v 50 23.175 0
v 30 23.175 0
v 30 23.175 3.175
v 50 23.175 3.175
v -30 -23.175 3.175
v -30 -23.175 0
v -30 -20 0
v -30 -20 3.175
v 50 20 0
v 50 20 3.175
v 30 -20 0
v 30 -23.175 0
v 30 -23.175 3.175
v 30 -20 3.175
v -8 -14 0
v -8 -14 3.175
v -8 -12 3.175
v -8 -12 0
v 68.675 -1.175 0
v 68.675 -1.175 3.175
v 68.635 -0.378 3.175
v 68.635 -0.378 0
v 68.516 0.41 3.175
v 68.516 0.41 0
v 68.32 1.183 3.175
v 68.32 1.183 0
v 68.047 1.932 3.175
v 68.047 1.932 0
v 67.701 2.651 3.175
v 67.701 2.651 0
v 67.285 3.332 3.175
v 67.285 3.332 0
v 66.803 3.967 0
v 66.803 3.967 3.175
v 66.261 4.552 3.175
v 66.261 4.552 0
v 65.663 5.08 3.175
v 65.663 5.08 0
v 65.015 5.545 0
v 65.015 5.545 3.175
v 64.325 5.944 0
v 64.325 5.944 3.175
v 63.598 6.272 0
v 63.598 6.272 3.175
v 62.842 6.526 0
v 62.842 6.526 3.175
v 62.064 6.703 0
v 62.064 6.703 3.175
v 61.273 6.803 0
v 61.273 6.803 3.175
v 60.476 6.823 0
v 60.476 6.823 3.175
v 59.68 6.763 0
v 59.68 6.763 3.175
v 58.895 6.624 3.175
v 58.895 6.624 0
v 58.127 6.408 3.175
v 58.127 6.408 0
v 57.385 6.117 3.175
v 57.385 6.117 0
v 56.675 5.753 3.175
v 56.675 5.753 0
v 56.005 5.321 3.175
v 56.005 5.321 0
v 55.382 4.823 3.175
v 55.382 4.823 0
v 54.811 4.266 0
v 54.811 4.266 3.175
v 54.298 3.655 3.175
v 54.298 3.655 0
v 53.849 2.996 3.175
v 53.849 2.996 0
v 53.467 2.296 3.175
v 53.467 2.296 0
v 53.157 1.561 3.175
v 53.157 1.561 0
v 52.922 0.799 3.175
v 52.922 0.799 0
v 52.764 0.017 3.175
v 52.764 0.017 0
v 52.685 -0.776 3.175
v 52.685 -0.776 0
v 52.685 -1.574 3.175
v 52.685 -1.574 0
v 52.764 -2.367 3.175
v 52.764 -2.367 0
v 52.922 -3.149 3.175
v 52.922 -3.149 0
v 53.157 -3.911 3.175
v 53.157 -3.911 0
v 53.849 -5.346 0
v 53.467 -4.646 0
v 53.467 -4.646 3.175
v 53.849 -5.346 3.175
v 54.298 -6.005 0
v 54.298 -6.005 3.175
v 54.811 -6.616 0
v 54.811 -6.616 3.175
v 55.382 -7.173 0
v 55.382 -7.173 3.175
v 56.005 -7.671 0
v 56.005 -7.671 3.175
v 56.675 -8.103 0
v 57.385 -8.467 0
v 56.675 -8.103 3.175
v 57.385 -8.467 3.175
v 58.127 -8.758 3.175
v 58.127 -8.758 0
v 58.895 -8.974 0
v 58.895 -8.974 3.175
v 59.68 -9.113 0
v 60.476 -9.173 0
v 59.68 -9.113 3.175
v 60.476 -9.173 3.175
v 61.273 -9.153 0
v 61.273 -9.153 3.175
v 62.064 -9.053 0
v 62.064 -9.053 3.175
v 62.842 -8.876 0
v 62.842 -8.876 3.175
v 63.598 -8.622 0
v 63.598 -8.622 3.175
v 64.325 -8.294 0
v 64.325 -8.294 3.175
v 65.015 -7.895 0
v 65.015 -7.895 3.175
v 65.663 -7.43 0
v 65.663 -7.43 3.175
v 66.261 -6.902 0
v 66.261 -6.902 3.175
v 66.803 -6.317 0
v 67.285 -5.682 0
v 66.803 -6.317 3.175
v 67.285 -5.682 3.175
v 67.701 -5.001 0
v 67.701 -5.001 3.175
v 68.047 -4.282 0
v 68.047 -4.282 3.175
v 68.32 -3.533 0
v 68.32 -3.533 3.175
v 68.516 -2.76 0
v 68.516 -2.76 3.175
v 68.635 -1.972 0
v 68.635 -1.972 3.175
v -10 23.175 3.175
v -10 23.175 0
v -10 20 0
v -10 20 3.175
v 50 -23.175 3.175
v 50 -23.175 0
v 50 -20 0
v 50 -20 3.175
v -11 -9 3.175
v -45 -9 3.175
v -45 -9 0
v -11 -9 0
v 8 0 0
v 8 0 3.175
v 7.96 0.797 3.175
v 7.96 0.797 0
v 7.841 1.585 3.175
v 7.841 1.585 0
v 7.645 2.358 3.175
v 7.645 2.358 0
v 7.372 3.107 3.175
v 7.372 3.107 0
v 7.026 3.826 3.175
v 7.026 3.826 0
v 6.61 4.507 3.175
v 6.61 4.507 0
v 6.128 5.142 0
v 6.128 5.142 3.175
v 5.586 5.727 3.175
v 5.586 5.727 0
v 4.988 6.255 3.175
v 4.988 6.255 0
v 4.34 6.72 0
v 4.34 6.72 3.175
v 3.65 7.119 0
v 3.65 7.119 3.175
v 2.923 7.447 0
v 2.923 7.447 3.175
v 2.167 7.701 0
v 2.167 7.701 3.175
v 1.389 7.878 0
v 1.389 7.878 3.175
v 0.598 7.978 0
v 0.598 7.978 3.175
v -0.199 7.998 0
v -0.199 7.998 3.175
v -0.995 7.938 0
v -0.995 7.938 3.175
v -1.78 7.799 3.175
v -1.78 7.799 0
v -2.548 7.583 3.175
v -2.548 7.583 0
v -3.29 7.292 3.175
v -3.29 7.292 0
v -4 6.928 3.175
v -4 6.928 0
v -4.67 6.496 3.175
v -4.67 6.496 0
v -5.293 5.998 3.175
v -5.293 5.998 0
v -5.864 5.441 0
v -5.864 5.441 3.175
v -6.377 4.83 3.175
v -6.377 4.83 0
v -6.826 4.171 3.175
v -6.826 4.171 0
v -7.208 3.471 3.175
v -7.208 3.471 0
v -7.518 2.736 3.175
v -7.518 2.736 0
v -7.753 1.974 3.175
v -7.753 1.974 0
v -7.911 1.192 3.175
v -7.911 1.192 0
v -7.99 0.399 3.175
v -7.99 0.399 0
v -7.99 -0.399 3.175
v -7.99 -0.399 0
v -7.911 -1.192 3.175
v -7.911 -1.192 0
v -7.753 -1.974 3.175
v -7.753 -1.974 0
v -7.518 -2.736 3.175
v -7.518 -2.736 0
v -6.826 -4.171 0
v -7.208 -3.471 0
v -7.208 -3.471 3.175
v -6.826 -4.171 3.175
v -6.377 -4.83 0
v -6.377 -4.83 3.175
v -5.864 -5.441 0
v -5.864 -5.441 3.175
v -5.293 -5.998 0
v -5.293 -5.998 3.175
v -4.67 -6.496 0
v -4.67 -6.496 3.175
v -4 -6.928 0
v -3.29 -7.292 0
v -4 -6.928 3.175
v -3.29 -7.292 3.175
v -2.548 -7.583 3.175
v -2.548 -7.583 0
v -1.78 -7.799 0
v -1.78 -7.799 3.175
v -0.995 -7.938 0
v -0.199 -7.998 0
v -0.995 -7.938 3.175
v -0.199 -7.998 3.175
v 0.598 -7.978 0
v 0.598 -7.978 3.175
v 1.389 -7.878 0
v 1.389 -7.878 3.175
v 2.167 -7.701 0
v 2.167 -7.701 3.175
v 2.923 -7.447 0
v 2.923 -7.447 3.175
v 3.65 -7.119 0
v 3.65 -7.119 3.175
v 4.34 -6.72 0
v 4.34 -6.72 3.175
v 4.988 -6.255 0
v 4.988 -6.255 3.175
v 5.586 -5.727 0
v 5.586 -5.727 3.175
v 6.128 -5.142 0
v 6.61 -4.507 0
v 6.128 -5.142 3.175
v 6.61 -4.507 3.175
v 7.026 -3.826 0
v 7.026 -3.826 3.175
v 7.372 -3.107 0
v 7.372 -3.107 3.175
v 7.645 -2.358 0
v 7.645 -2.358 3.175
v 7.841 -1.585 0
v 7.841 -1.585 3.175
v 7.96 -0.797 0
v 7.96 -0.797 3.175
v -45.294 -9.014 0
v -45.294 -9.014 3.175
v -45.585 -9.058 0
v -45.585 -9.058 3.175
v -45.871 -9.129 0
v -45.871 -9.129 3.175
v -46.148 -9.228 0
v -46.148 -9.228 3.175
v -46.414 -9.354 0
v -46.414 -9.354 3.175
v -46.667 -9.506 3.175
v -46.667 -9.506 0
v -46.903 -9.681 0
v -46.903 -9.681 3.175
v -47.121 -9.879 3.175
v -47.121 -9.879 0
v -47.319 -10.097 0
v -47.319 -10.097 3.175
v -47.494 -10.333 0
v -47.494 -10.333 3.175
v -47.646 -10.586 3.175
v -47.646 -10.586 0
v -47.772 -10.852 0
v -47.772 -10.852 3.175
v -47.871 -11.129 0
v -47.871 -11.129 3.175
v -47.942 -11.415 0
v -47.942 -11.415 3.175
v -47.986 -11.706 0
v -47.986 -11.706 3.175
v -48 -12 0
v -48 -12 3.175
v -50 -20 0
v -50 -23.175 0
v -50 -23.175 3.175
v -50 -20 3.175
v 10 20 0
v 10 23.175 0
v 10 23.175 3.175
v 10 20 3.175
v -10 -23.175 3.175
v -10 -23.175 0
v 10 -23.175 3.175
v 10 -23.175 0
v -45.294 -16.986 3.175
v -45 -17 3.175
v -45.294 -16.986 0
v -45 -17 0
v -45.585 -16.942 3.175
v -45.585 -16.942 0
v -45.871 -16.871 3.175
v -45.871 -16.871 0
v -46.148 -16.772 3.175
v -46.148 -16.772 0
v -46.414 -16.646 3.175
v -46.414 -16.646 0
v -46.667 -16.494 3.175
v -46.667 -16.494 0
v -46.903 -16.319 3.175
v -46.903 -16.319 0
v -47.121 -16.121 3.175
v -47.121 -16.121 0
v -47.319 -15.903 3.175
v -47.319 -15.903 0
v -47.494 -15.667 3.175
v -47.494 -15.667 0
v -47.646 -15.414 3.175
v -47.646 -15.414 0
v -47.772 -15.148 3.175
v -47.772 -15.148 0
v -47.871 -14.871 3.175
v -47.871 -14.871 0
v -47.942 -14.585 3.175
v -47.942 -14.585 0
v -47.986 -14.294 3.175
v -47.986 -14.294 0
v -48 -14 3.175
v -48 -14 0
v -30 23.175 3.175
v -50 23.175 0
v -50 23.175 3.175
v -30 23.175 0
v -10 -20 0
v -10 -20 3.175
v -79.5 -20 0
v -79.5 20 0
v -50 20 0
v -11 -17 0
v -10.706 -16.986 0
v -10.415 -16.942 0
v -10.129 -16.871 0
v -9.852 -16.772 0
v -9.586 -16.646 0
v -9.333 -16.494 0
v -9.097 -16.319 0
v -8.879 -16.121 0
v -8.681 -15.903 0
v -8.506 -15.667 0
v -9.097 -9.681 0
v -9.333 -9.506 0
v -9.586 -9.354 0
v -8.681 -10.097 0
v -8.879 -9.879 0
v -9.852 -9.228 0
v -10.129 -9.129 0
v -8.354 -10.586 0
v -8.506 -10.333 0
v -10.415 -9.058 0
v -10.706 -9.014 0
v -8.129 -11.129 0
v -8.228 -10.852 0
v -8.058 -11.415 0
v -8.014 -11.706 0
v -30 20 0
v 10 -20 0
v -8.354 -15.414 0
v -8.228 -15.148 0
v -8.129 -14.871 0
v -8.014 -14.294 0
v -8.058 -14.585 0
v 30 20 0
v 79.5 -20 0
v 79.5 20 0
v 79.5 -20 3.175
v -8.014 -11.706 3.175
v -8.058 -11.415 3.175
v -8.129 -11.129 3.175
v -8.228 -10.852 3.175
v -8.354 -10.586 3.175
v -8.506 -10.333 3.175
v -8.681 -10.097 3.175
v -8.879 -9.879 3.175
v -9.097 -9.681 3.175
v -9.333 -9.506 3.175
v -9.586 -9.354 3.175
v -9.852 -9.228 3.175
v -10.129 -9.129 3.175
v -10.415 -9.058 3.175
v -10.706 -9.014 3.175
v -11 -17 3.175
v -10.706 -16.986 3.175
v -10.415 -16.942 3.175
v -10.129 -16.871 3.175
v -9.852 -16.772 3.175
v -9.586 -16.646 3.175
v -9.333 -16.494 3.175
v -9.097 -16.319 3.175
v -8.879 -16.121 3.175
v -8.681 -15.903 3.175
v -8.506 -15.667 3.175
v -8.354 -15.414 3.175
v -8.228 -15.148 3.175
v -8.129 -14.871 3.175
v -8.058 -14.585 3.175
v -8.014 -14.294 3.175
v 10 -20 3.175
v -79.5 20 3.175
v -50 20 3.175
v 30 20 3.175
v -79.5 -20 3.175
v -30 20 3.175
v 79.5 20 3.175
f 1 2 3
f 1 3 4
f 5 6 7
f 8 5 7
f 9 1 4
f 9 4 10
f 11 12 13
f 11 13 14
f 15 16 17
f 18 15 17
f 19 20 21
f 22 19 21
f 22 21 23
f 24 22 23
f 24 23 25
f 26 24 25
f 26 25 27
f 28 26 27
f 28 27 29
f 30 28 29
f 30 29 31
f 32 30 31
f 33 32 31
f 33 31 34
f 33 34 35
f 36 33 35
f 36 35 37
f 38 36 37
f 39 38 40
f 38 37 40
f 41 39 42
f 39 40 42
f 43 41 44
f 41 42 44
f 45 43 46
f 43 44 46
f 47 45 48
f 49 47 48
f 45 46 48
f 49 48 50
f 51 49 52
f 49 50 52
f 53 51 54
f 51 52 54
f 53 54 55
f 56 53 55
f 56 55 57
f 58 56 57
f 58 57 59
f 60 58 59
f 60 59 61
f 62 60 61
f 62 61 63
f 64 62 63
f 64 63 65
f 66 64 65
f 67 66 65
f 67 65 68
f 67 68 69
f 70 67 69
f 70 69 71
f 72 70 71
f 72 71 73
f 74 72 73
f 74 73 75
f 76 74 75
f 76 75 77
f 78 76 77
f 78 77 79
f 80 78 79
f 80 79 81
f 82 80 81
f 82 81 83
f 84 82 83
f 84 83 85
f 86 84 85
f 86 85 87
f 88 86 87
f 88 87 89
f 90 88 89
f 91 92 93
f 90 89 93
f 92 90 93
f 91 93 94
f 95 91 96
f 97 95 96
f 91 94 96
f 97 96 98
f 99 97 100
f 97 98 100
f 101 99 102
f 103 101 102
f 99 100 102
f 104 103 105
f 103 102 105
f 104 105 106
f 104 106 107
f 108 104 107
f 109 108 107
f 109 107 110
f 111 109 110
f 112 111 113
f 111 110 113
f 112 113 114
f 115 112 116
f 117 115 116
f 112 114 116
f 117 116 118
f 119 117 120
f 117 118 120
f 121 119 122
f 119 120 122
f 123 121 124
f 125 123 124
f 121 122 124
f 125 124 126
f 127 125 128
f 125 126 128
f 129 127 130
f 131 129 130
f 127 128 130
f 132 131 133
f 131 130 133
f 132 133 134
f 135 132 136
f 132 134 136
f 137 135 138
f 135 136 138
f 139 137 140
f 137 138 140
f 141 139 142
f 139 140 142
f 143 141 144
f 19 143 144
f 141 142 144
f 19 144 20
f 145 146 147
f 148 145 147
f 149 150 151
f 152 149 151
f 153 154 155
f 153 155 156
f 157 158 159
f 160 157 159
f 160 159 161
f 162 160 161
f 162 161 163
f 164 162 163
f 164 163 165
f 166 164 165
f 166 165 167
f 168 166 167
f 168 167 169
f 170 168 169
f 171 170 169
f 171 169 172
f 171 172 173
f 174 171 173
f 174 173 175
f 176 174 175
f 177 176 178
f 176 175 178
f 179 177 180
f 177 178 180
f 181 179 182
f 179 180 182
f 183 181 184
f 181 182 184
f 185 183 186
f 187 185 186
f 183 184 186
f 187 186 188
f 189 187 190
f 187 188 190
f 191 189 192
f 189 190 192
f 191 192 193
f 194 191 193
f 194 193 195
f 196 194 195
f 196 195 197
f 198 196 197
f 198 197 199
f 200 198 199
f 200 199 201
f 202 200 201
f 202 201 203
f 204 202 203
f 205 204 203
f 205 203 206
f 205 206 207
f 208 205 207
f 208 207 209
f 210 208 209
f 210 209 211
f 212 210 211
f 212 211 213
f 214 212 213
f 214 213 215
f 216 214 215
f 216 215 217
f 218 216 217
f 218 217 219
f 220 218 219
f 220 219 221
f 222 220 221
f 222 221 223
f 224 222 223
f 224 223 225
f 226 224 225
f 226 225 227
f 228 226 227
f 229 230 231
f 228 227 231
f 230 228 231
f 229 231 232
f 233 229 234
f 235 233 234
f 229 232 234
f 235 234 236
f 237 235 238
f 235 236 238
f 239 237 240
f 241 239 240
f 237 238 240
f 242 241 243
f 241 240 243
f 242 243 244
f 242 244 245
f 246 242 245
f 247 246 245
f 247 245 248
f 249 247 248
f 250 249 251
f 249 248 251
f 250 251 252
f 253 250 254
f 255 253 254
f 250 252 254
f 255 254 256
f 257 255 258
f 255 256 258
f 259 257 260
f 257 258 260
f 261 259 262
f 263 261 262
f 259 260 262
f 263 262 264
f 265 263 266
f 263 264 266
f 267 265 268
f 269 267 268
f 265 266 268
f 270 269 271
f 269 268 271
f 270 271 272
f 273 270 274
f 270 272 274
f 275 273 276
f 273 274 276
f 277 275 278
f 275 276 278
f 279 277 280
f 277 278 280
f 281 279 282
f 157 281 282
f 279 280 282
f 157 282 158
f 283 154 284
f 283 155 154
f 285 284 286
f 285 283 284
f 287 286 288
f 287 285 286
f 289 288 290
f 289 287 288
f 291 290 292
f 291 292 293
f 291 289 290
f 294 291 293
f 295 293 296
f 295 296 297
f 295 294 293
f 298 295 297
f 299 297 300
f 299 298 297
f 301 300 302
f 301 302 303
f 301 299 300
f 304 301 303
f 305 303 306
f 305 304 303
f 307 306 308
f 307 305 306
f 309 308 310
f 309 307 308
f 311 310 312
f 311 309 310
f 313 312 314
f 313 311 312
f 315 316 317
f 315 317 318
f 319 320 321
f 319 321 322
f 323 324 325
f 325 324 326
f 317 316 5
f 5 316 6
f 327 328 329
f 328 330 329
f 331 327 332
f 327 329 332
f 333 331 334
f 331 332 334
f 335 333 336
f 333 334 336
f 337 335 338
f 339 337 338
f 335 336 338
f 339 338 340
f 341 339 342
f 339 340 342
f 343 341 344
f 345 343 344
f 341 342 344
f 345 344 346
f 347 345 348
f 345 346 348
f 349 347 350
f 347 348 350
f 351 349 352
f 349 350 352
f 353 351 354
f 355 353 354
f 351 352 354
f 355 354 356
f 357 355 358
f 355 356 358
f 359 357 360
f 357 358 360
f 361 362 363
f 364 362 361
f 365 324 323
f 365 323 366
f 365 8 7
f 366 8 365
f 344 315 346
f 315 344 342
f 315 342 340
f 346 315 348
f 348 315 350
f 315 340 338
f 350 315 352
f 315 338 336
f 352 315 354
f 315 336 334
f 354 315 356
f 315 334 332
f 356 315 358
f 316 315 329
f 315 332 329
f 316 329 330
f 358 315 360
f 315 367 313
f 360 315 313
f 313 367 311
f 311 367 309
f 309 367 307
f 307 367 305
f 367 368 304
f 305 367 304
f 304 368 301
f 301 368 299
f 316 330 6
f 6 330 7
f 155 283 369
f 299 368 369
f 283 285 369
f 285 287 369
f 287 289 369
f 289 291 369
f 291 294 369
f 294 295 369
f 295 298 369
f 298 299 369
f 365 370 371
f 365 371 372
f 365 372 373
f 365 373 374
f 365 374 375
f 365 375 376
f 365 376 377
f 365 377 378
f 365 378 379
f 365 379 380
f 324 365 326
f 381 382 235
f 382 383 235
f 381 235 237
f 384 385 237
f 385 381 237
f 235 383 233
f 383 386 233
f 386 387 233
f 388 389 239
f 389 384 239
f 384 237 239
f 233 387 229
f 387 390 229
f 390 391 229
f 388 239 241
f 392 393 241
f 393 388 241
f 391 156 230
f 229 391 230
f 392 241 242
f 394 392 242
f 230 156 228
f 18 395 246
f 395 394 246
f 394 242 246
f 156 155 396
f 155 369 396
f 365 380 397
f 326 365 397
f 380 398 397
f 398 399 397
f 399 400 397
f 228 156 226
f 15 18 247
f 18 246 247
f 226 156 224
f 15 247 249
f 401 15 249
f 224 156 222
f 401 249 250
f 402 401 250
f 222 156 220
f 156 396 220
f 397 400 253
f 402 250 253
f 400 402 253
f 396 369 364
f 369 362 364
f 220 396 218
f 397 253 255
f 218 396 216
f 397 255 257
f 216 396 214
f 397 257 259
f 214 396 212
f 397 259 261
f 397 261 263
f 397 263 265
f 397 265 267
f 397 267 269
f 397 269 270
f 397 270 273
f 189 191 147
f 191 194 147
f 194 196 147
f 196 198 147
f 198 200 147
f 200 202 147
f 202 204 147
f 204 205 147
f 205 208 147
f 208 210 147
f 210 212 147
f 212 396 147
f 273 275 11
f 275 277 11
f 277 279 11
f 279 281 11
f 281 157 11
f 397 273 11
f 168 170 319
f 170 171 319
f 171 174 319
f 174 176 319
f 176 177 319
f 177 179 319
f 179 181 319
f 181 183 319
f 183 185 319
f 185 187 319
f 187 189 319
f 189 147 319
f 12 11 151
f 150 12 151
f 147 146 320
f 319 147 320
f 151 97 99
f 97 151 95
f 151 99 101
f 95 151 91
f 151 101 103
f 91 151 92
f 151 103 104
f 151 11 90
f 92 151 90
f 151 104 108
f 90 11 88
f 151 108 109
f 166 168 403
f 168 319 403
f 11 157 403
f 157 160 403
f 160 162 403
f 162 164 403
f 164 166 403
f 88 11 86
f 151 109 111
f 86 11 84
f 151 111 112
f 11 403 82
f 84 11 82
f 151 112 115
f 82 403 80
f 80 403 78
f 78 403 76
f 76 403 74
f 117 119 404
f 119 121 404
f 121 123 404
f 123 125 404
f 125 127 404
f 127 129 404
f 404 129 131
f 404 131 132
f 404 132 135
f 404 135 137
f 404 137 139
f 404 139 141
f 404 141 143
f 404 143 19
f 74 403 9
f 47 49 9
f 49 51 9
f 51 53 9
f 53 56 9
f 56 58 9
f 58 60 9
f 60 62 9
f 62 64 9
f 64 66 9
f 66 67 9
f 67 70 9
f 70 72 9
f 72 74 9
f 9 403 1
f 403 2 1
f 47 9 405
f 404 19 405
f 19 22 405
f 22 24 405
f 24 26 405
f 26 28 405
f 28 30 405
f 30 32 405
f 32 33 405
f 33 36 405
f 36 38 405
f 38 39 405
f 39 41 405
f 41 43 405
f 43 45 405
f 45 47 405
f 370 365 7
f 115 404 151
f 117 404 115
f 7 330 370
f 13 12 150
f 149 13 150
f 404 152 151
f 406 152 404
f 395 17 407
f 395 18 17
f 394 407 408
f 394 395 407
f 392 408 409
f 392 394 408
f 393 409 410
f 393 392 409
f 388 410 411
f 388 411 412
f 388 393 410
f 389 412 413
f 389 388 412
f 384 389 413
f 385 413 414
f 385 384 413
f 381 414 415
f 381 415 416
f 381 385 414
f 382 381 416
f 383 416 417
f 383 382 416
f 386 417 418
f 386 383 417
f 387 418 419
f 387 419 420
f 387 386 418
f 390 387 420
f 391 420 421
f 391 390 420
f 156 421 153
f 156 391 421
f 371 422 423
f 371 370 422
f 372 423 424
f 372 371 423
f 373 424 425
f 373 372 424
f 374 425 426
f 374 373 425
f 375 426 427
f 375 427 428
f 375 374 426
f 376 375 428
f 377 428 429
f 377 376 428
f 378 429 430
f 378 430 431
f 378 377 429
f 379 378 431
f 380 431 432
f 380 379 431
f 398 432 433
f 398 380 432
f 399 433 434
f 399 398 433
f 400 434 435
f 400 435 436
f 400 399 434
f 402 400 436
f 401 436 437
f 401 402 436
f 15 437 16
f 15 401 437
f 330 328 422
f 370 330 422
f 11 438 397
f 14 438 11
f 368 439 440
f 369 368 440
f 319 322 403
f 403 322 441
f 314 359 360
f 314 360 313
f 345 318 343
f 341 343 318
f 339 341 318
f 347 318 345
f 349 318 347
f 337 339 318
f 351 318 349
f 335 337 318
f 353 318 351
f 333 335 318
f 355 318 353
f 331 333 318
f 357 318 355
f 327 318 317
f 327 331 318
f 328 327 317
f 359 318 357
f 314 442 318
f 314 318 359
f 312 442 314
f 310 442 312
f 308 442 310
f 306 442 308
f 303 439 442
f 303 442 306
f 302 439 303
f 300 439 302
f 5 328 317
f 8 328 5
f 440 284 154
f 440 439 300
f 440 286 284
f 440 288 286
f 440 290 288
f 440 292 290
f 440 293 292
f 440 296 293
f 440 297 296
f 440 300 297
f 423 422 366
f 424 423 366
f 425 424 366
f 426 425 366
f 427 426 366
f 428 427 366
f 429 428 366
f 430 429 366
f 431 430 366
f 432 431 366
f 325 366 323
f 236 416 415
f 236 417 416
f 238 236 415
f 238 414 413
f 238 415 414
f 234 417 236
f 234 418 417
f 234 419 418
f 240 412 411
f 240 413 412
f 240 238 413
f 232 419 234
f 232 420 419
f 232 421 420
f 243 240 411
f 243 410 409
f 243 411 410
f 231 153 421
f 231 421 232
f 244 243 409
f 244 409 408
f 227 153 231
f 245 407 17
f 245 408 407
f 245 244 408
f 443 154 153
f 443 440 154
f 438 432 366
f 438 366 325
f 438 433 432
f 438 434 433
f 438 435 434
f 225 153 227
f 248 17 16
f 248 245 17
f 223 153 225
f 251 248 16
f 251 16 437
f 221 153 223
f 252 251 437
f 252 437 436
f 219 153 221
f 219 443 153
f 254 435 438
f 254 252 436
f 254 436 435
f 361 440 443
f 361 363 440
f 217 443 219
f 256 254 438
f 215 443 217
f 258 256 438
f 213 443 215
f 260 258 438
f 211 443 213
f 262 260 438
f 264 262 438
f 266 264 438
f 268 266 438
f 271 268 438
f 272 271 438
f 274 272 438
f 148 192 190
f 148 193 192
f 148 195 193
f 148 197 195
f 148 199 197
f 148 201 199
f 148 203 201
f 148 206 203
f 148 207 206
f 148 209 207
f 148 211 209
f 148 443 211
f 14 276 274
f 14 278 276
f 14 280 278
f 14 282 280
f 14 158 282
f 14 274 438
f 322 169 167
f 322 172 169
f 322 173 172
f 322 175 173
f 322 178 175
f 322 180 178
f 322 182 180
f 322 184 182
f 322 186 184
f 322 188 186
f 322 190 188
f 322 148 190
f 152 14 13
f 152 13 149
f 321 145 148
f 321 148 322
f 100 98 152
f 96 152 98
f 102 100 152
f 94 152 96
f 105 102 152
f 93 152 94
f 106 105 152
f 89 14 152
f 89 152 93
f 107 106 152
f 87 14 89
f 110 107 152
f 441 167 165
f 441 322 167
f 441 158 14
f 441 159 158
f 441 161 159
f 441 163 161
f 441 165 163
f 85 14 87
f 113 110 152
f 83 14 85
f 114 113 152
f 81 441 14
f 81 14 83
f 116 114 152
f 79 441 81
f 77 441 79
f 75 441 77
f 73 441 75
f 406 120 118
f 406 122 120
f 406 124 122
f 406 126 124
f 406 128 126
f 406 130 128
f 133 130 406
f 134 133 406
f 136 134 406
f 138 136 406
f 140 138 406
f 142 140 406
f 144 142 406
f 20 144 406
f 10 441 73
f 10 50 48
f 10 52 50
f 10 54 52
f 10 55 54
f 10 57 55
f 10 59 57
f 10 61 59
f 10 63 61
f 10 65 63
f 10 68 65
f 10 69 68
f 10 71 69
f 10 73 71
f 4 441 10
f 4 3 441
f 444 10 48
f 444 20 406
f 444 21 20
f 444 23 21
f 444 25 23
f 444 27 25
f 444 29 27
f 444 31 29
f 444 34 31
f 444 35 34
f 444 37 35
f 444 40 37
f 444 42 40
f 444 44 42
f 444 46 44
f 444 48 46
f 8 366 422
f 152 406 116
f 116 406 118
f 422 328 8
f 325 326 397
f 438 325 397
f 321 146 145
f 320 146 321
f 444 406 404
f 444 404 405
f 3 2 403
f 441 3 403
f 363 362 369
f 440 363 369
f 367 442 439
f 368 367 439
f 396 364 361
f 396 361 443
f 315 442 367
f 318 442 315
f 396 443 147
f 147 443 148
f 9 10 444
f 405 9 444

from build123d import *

# Parameters (mm, degrees)
ESQUISSE1_W             = 165.35
ESQUISSE1_H             = 46.35
BOSS_EXTRU_1_DEPTH      = 3.175
ESQUISSE5_W             = 20
ESQUISSE5_H             = 3.175
ESQUISSE5_W_2           = 26.325
ENL_V_MAT_EXTRU_2_DEPTH = 86.920410119
ESQUISSE7_W             = 3.175
ESQUISSE7_H             = 46.35
ENL_V_MAT_EXTRU_4_DEPTH = 86.920410119
ESQUISSE8_W             = 3.175
ESQUISSE8_H             = 3.175
ENL_V_MAT_EXTRU_5_DEPTH = 83.869845239
ESQUISSE6_R             = 8
ENL_V_MAT_EXTRU_3_DEPTH = 83.869845239
ESQUISSE9_W             = 40
ESQUISSE9_H             = 8
ENL_V_MAT_EXTRU_6_DEPTH = 83.869845239
CONG_1_R                = 3


with BuildPart() as part:
    # Esquisse1 → Boss.-Extru.1 (new body)
    with BuildSketch(Plane.XY):
        Rectangle(ESQUISSE1_W, ESQUISSE1_H)
    extrude(amount=BOSS_EXTRU_1_DEPTH)

    # Esquisse5 → Enlèv. mat.-Extru.2 (cut, through all)
    with BuildSketch(Plane.XY.offset(3.175)):
        with Locations((-20, -21.5875)):
            Rectangle(ESQUISSE5_W, ESQUISSE5_H)
        with Locations((20, -21.5875)):
            Rectangle(ESQUISSE5_W, ESQUISSE5_H)
        with Locations((63.1625, -21.5875)):
            Rectangle(ESQUISSE5_W_2, ESQUISSE5_H)
        with Locations((-63.1625, -21.5875)):
            Rectangle(ESQUISSE5_W_2, ESQUISSE5_H)
    enl_v_mat_extru_2 = extrude(amount=-ENL_V_MAT_EXTRU_2_DEPTH, mode=Mode.SUBTRACT)

    # Symétrie2: Enlèv. mat.-Extru.2 across plane
    add(enl_v_mat_extru_2.mirror(Plane.ZX), mode=Mode.SUBTRACT)

    # Esquisse7 → Enlèv. mat.-Extru.4 (cut, through all)
    with BuildSketch(Plane.XY.offset(3.175)):
        with Locations((-81.0875, 0)):
            Rectangle(ESQUISSE7_W, ESQUISSE7_H)
        with Locations((81.0875, 0)):
            Rectangle(ESQUISSE7_W, ESQUISSE7_H)
    extrude(amount=-ENL_V_MAT_EXTRU_4_DEPTH, mode=Mode.SUBTRACT)

    # Esquisse8 → Enlèv. mat.-Extru.5 (cut, through all)
    with BuildSketch(Plane.XY.offset(3.175)):
        with Locations((-77.9125, 21.5875)):
            Rectangle(ESQUISSE8_W, ESQUISSE8_H)
        with Locations((-77.9125, -21.5875)):
            Rectangle(ESQUISSE8_W, ESQUISSE8_H)
        with Locations((77.9125, -21.5875)):
            Rectangle(ESQUISSE8_W, ESQUISSE8_H)
        with Locations((77.9125, 21.5875)):
            Rectangle(ESQUISSE8_W, ESQUISSE8_H)
    extrude(amount=-ENL_V_MAT_EXTRU_5_DEPTH, mode=Mode.SUBTRACT)

    # Esquisse6 → Enlèv. mat.-Extru.3 (cut, through all)
    with BuildSketch(Plane.XY.offset(3.175)):
        Circle(ESQUISSE6_R)
        with Locations((60.675, -1.175)):
            Circle(ESQUISSE6_R)
    extrude(amount=-ENL_V_MAT_EXTRU_3_DEPTH, mode=Mode.SUBTRACT)

    # Esquisse9 → Enlèv. mat.-Extru.6 (cut, through all)
    with BuildSketch(Plane.XY.offset(3.175)):
        with Locations((-28, -13)):
            Rectangle(ESQUISSE9_W, ESQUISSE9_H)
    extrude(amount=-ENL_V_MAT_EXTRU_6_DEPTH, mode=Mode.SUBTRACT)

    # Congé1
    cong_1_edges = [part.edges().sort_by_distance(p)[0] for p in [
        (-48, -17, 1.5875),
        (-48, -9, 1.5875),
        (-8, -9, 1.5875),
        (-8, -17, 1.5875),
    ]]
    fillet(cong_1_edges, radius=CONG_1_R)


solid = part.part
